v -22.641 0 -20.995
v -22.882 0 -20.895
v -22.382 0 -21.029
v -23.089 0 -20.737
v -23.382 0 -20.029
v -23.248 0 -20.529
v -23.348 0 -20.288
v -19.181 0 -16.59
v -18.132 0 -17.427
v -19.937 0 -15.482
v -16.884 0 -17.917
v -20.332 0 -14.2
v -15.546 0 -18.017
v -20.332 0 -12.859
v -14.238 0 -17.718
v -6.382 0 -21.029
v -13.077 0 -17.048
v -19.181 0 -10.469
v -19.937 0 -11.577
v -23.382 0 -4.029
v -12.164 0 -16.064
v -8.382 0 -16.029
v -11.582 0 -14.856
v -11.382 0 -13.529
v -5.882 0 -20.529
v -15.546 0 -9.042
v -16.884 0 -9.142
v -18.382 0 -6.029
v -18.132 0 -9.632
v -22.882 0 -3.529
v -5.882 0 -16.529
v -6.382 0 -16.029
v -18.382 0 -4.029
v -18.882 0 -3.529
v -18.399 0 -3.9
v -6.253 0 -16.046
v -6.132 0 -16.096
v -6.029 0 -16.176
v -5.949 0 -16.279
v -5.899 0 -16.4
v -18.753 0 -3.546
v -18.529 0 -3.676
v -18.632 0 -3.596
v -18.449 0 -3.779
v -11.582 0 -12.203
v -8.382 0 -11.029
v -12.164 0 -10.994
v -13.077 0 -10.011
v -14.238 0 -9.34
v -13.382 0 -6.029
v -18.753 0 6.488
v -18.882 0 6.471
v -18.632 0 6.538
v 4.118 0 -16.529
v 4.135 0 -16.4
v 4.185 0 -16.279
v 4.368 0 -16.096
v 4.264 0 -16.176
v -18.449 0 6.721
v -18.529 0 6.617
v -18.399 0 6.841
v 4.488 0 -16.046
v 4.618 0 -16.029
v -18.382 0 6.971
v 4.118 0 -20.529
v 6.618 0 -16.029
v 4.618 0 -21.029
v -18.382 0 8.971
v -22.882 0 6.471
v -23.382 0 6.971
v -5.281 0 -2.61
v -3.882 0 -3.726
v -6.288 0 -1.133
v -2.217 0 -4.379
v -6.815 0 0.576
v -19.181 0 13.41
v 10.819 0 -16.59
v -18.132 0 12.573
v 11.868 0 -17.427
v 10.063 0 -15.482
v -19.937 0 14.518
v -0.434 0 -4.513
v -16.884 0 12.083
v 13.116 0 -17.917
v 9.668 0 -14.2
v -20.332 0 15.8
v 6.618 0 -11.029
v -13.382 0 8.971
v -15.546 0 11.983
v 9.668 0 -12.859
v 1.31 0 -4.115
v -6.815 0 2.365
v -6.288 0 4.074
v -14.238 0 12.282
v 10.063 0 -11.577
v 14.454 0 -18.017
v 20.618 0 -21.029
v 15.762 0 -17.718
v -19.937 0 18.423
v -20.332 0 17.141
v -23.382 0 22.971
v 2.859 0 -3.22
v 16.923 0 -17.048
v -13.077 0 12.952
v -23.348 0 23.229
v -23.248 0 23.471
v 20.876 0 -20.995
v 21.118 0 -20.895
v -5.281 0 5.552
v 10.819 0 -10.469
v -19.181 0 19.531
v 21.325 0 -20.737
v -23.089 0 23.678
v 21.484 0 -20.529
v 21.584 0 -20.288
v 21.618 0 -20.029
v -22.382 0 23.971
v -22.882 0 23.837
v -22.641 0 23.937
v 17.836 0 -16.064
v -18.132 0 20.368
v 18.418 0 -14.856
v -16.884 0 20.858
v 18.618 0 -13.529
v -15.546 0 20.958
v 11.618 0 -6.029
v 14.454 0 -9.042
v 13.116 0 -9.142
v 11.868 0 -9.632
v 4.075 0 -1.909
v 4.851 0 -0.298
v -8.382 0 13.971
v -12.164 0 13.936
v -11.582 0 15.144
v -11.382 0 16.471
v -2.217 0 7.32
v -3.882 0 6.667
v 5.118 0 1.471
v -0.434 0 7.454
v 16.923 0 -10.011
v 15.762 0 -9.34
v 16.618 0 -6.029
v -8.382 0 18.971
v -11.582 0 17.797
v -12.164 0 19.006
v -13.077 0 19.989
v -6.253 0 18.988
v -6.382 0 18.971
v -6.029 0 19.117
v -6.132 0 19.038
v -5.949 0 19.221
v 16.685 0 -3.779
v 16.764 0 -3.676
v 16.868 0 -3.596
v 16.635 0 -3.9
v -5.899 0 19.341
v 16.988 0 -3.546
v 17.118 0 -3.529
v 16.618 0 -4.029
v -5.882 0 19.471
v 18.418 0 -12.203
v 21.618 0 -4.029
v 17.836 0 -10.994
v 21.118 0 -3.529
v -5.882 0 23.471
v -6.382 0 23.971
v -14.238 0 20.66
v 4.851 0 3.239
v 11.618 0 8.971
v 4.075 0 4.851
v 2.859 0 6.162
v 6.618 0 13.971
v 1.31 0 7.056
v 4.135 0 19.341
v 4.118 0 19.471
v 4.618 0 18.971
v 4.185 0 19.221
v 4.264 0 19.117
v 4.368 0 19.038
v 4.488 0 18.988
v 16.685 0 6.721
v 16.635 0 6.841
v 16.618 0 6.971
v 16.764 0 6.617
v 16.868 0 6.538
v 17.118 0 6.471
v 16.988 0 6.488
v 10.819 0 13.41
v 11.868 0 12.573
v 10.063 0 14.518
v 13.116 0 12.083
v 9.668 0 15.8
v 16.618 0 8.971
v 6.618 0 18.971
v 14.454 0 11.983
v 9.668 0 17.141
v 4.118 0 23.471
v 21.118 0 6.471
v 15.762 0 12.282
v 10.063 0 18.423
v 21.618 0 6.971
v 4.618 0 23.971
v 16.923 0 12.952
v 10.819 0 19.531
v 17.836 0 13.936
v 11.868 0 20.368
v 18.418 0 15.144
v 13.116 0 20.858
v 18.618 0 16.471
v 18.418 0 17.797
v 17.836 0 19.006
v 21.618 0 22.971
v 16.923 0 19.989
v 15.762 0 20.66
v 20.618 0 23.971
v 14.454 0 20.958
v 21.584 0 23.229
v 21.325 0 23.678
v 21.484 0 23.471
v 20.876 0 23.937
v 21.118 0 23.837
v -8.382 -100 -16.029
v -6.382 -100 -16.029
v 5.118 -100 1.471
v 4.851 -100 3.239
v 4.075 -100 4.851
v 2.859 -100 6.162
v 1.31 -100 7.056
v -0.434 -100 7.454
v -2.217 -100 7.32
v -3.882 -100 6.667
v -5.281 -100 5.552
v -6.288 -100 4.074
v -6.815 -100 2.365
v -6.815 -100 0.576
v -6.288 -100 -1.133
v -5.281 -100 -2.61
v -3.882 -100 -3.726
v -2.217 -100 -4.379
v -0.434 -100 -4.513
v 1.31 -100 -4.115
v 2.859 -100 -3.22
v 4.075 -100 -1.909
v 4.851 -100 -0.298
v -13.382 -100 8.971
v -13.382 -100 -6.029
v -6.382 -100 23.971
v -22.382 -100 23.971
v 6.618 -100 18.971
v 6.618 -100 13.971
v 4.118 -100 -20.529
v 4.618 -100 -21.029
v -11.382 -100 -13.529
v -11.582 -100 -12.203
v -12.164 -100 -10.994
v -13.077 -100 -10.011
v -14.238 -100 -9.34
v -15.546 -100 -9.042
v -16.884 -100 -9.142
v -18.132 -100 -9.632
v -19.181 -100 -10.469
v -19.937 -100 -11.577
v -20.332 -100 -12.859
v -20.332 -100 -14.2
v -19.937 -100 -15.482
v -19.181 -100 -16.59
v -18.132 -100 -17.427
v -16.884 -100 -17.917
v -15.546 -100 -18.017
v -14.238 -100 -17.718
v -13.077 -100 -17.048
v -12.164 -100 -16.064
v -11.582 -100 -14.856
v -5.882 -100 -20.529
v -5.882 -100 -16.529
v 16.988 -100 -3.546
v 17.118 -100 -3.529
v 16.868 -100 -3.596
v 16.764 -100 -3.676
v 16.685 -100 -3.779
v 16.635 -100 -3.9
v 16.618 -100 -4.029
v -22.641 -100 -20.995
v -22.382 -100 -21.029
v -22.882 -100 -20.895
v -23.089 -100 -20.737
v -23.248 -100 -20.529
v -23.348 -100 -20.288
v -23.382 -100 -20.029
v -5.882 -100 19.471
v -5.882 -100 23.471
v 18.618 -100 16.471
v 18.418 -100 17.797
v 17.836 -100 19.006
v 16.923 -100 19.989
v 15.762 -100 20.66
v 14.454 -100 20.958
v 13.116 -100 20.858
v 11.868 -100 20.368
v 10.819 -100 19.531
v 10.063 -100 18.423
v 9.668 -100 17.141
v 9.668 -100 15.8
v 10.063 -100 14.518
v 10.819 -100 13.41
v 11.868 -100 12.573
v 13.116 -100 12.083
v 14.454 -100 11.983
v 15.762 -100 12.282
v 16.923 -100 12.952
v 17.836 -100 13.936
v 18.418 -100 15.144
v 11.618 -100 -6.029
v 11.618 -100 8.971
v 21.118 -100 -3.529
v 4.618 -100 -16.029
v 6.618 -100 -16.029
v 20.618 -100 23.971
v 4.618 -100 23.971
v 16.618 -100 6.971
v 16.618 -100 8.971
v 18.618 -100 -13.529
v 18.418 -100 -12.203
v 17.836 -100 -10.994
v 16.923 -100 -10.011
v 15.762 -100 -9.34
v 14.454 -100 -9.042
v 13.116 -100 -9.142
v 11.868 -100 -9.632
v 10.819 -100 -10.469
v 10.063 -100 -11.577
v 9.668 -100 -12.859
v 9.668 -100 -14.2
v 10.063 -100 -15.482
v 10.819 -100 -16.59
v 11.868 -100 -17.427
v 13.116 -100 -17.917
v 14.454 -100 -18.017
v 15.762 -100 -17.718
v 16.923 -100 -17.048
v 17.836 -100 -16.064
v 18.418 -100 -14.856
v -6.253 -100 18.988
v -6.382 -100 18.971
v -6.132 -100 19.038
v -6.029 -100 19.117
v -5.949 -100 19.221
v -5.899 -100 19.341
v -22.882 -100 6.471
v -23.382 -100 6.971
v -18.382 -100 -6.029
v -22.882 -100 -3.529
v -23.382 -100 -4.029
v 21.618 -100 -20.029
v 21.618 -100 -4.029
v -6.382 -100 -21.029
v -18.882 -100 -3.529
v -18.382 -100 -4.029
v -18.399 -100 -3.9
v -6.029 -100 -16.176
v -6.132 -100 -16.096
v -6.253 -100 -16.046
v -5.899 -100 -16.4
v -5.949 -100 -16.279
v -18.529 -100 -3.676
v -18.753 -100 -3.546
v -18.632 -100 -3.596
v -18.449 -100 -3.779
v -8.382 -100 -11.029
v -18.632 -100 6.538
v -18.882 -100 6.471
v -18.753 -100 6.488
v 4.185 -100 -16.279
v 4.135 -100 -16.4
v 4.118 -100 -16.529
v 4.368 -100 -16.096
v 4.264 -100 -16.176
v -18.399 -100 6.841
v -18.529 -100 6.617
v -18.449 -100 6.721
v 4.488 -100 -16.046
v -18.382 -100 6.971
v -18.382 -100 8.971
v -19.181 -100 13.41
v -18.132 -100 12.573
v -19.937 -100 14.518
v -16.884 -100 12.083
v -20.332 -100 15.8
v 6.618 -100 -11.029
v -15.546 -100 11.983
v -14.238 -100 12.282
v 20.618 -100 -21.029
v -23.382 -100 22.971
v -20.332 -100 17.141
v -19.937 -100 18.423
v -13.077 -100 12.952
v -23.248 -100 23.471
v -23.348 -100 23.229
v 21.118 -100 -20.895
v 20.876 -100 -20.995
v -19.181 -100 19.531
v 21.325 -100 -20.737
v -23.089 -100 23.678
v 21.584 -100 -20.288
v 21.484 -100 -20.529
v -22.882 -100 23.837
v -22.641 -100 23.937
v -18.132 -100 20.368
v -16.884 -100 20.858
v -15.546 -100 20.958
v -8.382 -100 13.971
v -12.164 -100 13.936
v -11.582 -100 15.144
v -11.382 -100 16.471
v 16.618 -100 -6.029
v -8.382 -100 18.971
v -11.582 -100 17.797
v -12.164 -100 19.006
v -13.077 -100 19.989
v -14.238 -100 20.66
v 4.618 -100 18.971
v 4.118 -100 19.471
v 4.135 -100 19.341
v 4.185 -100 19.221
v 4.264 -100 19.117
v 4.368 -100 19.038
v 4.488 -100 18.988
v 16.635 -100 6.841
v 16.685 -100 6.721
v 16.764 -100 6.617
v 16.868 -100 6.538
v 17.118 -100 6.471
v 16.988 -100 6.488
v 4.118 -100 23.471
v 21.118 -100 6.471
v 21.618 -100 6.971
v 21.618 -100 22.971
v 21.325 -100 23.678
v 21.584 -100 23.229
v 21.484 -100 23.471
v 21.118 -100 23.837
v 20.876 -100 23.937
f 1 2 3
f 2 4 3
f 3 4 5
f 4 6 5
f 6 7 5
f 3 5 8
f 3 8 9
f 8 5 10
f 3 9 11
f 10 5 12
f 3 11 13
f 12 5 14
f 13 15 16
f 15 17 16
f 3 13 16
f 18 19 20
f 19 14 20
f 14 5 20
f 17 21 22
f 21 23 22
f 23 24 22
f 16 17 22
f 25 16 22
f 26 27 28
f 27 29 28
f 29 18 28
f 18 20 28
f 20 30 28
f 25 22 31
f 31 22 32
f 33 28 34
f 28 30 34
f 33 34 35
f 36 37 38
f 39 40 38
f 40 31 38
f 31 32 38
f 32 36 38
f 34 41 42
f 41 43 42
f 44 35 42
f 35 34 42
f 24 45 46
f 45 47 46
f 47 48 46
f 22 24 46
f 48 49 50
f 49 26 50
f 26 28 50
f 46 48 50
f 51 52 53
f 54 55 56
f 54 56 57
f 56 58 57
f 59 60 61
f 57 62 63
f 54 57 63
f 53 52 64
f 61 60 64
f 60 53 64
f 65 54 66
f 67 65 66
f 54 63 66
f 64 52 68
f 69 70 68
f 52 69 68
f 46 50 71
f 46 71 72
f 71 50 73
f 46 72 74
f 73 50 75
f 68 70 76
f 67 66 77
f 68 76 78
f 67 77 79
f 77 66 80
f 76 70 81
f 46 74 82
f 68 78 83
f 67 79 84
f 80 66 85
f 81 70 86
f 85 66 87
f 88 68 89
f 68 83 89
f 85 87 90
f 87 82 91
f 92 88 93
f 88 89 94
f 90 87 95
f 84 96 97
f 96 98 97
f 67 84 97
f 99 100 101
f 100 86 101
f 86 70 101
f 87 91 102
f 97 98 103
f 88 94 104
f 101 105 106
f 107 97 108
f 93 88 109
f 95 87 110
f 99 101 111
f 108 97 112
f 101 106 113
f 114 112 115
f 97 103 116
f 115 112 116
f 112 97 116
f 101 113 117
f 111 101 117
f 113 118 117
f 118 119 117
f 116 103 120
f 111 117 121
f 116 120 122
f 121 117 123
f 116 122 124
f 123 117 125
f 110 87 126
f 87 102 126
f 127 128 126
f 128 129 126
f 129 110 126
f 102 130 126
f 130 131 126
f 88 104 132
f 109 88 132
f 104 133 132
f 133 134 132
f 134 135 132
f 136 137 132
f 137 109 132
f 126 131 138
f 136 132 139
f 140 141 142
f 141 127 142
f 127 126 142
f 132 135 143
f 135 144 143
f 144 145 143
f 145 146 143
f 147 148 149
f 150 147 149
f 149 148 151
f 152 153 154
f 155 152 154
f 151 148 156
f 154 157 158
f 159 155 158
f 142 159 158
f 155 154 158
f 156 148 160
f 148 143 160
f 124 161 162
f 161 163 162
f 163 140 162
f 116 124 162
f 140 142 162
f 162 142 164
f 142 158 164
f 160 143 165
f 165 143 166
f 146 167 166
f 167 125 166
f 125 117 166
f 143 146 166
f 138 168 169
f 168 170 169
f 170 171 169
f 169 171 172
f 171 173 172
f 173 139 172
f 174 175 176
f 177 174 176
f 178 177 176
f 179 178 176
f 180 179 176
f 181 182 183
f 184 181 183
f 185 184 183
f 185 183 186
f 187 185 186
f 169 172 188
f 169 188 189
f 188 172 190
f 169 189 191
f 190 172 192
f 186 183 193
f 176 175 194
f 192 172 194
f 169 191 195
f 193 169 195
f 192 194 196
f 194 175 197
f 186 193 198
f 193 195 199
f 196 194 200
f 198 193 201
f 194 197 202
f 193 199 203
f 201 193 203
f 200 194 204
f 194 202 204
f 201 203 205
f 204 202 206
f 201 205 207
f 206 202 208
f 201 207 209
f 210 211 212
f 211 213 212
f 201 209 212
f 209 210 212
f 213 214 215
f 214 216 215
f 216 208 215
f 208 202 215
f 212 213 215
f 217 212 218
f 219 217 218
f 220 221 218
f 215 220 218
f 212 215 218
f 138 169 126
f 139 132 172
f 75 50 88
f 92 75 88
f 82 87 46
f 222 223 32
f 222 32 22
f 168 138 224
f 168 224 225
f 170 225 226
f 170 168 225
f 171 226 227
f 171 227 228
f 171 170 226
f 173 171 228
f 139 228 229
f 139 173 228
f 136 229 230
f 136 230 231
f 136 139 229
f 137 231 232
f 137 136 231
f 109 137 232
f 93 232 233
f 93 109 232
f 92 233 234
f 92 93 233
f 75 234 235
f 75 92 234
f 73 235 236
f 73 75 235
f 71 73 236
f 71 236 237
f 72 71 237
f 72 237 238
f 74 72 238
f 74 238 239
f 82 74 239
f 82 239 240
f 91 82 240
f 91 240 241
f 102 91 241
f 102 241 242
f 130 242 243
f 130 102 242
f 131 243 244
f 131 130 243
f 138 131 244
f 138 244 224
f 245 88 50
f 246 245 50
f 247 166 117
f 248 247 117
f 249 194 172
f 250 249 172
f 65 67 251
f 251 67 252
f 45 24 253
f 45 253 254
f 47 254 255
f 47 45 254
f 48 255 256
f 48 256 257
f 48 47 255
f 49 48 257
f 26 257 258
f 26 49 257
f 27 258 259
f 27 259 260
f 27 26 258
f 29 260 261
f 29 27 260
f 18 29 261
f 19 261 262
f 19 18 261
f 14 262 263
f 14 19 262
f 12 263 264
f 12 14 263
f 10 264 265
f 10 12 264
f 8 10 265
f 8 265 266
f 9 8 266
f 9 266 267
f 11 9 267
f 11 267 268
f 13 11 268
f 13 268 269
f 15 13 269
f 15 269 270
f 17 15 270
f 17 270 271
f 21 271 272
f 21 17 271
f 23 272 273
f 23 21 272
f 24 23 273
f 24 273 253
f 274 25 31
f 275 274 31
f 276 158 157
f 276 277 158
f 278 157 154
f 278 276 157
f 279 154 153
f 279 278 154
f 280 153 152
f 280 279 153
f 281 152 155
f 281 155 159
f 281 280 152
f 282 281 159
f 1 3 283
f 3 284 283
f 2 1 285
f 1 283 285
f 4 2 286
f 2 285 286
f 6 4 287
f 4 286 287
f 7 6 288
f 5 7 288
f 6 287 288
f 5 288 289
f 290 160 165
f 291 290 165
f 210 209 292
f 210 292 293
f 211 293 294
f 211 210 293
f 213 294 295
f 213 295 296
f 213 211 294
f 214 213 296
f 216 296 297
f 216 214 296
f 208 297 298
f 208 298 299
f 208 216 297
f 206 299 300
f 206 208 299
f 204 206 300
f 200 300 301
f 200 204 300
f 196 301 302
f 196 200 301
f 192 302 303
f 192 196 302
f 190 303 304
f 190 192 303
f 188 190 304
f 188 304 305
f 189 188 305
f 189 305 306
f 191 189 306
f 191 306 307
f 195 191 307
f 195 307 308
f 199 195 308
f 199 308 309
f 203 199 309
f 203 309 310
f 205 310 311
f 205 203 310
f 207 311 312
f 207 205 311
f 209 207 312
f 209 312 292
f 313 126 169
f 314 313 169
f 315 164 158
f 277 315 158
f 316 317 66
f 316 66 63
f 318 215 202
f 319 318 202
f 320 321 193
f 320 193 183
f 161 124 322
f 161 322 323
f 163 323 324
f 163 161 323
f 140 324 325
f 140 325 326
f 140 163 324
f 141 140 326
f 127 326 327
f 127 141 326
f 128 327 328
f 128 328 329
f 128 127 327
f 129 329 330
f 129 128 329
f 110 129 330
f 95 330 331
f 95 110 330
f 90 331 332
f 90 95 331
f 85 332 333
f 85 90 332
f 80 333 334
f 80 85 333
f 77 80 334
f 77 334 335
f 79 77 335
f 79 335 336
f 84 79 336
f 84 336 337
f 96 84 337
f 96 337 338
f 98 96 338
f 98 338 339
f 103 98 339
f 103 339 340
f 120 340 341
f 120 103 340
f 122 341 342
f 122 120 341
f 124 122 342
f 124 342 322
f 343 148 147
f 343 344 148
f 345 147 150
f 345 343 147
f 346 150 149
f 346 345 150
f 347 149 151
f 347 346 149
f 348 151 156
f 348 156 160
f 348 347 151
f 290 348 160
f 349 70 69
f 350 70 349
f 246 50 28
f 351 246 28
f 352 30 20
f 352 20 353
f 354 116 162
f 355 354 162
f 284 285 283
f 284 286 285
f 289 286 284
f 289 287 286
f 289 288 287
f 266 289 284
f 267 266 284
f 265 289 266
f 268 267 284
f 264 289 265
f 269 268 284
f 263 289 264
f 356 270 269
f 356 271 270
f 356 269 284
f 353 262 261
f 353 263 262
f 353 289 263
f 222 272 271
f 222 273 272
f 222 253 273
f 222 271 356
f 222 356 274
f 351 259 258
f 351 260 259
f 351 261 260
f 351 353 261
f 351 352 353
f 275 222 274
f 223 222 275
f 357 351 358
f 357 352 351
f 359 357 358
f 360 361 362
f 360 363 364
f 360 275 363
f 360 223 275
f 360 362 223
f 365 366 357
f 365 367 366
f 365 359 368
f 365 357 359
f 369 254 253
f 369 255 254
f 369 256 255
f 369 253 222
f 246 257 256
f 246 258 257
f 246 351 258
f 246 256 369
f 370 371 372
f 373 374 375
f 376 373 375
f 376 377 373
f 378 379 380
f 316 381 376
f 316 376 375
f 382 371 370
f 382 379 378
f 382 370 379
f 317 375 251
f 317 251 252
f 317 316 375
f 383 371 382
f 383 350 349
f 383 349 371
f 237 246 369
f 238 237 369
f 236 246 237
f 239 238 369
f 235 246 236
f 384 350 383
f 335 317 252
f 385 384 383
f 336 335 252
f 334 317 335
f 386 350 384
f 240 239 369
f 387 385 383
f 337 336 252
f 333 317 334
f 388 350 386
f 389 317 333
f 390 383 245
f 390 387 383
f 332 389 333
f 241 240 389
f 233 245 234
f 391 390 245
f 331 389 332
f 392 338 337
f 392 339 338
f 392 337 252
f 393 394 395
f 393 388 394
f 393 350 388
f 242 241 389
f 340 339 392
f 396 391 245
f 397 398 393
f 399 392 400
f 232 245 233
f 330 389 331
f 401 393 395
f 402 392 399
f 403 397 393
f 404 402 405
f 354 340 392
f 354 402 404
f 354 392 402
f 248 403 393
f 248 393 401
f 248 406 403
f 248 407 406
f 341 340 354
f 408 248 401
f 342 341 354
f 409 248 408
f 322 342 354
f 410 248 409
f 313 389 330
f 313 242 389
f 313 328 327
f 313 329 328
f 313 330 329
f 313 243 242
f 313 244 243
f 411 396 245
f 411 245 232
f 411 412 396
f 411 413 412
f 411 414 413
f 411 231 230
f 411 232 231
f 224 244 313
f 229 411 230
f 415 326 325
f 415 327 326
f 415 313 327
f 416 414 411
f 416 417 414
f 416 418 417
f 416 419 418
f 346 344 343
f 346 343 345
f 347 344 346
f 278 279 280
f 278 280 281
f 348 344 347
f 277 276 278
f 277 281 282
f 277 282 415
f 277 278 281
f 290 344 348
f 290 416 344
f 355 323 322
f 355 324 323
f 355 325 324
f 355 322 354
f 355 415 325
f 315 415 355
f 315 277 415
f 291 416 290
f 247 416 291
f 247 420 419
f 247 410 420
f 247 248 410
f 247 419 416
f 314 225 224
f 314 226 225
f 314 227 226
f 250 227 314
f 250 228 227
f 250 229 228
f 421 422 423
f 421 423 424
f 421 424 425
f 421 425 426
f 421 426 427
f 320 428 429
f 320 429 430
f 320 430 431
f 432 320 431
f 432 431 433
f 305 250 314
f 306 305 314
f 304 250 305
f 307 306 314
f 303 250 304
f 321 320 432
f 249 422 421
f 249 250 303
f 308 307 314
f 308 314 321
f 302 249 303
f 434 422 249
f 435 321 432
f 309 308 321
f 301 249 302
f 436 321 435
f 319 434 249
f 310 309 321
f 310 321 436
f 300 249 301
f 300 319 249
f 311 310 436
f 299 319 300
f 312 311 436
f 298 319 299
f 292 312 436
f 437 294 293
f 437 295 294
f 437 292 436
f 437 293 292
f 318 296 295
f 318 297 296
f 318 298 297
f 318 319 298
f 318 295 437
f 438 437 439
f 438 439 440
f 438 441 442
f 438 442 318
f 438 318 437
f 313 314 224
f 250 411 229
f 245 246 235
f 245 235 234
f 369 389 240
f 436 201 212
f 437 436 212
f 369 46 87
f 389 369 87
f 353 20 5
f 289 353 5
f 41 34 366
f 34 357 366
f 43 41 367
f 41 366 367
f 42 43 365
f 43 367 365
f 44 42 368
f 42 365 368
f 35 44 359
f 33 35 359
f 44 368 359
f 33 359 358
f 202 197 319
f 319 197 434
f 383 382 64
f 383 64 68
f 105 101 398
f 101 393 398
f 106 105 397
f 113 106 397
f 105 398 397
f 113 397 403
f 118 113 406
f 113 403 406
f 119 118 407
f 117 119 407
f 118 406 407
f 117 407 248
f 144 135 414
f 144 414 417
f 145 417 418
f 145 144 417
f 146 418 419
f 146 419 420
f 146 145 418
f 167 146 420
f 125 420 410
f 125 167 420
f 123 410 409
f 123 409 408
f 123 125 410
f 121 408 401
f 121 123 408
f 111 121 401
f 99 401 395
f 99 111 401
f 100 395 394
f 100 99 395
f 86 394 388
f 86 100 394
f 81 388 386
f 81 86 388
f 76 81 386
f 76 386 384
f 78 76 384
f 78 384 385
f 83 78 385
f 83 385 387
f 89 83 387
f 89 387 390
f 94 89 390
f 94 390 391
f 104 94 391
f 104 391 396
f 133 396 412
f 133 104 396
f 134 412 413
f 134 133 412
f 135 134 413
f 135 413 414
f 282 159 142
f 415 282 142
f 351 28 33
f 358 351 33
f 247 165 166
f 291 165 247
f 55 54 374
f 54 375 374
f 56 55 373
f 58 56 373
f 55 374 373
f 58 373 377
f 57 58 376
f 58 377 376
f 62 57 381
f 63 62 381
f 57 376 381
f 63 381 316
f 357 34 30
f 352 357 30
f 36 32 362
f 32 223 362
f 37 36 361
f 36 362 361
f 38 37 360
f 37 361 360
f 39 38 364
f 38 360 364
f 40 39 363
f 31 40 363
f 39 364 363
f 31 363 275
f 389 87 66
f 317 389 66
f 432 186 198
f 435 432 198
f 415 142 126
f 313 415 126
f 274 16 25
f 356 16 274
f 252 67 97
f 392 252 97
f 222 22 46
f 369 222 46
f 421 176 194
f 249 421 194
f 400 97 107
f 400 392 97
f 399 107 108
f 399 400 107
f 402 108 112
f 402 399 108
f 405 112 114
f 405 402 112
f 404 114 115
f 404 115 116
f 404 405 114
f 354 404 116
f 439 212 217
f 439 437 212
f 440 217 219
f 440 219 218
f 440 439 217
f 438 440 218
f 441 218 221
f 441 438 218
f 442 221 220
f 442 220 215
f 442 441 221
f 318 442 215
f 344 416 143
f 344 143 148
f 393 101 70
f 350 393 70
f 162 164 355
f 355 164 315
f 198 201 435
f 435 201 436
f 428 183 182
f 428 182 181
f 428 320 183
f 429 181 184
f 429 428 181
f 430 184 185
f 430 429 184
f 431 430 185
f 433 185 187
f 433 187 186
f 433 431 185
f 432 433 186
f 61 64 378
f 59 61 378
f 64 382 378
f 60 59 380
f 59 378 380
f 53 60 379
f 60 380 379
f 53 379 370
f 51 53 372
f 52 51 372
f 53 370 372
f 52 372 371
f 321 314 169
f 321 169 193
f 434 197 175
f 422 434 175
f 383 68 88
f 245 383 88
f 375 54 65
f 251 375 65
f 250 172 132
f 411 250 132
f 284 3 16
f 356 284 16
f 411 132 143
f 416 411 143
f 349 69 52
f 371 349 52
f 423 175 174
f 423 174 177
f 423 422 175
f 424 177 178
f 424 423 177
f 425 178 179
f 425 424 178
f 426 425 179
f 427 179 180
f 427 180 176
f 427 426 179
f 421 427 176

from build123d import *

# Parameters (mm, degrees)
F0_R     = 4.5
F0_R_2   = 6
F1_DEPTH = 100
F2_R     = 1
F3_R     = 0.5
F4_SIZE  = 0.5


with BuildPart() as f1:
    # F0 (on Front) → F1 (new body)
    with BuildSketch(Plane.XZ):
        Polygon((4.117647, -21.029412), (21.617647, -21.029412), (21.617647, -3.529412), (16.617647, -3.529412), (16.617647, -6.029412), (11.617647, -6.029412), (11.617647, 8.970588), (16.617647, 8.970588), (16.617647, 6.470588), (21.617647, 6.470588), (21.617647, 23.970588), (4.117647, 23.970588), (4.117647, 18.970588), (6.617647, 18.970588), (6.617647, 13.970588), (-8.382353, 13.970588), (-8.382353, 18.970588), (-5.882353, 18.970588), (-5.882353, 23.970588), (-23.382353, 23.970588), (-23.382353, 6.470588), (-18.382353, 6.470588), (-18.382353, 8.970588), (-13.382353, 8.970588), (-13.382353, -6.029412), (-18.382353, -6.029412), (-18.382353, -3.529412), (-23.382353, -3.529412), (-23.382353, -21.029412), (-5.882353, -21.029412), (-5.882353, -16.029412), (-8.382353, -16.029412), (-8.382353, -11.029412), (6.617647, -11.029412), (6.617647, -16.029412), (4.117647, -16.029412), align=None)
        with Locations((-15.882353, -13.529412)):
            Circle(F0_R, mode=Mode.SUBTRACT)
        with Locations((14.117647, -13.529412)):
            Circle(F0_R, mode=Mode.SUBTRACT)
        with Locations((-0.882353, 1.470588)):
            Circle(F0_R_2, mode=Mode.SUBTRACT)
        with Locations((-15.882353, 16.470588)):
            Circle(F0_R, mode=Mode.SUBTRACT)
        with Locations((14.117647, 16.470588)):
            Circle(F0_R, mode=Mode.SUBTRACT)
    extrude(amount=F1_DEPTH)

    # F2
    f2_edges = [f1.edges().sort_by_distance(p)[0] for p in [
        (21.617647, -50, 23.970588),
        (21.617647, -50, -21.029412),
        (-23.382353, -50, -21.029412),
        (-23.382353, -50, 23.970588),
    ]]
    fillet(f2_edges, radius=F2_R)

    # F3
    f3_edges = [f1.edges().sort_by_distance(p)[0] for p in [
        (4.117647, -50, -16.029412),
        (16.617647, -50, 6.470588),
        (16.617647, -50, -3.529412),
        (4.117647, -50, 18.970588),
        (-5.882353, -50, 18.970588),
        (-18.382353, -50, 6.470588),
        (-18.382353, -50, -3.529412),
        (-5.882353, -50, -16.029412),
    ]]
    fillet(f3_edges, radius=F3_R)

    # F4
    f4_edges = [f1.edges().sort_by_distance(p)[0] for p in [
        (-23.382353, -50, -3.529412),
        (-23.382353, -50, 6.470588),
        (-5.882353, -50, 23.970588),
        (4.117647, -50, 23.970588),
        (21.617647, -50, -3.529412),
        (4.117647, -50, -21.029412),
        (21.617647, -50, 6.470588),
        (-5.882353, -50, -21.029412),
    ]]
    chamfer(f4_edges, length=F4_SIZE)


solid = f1.part
